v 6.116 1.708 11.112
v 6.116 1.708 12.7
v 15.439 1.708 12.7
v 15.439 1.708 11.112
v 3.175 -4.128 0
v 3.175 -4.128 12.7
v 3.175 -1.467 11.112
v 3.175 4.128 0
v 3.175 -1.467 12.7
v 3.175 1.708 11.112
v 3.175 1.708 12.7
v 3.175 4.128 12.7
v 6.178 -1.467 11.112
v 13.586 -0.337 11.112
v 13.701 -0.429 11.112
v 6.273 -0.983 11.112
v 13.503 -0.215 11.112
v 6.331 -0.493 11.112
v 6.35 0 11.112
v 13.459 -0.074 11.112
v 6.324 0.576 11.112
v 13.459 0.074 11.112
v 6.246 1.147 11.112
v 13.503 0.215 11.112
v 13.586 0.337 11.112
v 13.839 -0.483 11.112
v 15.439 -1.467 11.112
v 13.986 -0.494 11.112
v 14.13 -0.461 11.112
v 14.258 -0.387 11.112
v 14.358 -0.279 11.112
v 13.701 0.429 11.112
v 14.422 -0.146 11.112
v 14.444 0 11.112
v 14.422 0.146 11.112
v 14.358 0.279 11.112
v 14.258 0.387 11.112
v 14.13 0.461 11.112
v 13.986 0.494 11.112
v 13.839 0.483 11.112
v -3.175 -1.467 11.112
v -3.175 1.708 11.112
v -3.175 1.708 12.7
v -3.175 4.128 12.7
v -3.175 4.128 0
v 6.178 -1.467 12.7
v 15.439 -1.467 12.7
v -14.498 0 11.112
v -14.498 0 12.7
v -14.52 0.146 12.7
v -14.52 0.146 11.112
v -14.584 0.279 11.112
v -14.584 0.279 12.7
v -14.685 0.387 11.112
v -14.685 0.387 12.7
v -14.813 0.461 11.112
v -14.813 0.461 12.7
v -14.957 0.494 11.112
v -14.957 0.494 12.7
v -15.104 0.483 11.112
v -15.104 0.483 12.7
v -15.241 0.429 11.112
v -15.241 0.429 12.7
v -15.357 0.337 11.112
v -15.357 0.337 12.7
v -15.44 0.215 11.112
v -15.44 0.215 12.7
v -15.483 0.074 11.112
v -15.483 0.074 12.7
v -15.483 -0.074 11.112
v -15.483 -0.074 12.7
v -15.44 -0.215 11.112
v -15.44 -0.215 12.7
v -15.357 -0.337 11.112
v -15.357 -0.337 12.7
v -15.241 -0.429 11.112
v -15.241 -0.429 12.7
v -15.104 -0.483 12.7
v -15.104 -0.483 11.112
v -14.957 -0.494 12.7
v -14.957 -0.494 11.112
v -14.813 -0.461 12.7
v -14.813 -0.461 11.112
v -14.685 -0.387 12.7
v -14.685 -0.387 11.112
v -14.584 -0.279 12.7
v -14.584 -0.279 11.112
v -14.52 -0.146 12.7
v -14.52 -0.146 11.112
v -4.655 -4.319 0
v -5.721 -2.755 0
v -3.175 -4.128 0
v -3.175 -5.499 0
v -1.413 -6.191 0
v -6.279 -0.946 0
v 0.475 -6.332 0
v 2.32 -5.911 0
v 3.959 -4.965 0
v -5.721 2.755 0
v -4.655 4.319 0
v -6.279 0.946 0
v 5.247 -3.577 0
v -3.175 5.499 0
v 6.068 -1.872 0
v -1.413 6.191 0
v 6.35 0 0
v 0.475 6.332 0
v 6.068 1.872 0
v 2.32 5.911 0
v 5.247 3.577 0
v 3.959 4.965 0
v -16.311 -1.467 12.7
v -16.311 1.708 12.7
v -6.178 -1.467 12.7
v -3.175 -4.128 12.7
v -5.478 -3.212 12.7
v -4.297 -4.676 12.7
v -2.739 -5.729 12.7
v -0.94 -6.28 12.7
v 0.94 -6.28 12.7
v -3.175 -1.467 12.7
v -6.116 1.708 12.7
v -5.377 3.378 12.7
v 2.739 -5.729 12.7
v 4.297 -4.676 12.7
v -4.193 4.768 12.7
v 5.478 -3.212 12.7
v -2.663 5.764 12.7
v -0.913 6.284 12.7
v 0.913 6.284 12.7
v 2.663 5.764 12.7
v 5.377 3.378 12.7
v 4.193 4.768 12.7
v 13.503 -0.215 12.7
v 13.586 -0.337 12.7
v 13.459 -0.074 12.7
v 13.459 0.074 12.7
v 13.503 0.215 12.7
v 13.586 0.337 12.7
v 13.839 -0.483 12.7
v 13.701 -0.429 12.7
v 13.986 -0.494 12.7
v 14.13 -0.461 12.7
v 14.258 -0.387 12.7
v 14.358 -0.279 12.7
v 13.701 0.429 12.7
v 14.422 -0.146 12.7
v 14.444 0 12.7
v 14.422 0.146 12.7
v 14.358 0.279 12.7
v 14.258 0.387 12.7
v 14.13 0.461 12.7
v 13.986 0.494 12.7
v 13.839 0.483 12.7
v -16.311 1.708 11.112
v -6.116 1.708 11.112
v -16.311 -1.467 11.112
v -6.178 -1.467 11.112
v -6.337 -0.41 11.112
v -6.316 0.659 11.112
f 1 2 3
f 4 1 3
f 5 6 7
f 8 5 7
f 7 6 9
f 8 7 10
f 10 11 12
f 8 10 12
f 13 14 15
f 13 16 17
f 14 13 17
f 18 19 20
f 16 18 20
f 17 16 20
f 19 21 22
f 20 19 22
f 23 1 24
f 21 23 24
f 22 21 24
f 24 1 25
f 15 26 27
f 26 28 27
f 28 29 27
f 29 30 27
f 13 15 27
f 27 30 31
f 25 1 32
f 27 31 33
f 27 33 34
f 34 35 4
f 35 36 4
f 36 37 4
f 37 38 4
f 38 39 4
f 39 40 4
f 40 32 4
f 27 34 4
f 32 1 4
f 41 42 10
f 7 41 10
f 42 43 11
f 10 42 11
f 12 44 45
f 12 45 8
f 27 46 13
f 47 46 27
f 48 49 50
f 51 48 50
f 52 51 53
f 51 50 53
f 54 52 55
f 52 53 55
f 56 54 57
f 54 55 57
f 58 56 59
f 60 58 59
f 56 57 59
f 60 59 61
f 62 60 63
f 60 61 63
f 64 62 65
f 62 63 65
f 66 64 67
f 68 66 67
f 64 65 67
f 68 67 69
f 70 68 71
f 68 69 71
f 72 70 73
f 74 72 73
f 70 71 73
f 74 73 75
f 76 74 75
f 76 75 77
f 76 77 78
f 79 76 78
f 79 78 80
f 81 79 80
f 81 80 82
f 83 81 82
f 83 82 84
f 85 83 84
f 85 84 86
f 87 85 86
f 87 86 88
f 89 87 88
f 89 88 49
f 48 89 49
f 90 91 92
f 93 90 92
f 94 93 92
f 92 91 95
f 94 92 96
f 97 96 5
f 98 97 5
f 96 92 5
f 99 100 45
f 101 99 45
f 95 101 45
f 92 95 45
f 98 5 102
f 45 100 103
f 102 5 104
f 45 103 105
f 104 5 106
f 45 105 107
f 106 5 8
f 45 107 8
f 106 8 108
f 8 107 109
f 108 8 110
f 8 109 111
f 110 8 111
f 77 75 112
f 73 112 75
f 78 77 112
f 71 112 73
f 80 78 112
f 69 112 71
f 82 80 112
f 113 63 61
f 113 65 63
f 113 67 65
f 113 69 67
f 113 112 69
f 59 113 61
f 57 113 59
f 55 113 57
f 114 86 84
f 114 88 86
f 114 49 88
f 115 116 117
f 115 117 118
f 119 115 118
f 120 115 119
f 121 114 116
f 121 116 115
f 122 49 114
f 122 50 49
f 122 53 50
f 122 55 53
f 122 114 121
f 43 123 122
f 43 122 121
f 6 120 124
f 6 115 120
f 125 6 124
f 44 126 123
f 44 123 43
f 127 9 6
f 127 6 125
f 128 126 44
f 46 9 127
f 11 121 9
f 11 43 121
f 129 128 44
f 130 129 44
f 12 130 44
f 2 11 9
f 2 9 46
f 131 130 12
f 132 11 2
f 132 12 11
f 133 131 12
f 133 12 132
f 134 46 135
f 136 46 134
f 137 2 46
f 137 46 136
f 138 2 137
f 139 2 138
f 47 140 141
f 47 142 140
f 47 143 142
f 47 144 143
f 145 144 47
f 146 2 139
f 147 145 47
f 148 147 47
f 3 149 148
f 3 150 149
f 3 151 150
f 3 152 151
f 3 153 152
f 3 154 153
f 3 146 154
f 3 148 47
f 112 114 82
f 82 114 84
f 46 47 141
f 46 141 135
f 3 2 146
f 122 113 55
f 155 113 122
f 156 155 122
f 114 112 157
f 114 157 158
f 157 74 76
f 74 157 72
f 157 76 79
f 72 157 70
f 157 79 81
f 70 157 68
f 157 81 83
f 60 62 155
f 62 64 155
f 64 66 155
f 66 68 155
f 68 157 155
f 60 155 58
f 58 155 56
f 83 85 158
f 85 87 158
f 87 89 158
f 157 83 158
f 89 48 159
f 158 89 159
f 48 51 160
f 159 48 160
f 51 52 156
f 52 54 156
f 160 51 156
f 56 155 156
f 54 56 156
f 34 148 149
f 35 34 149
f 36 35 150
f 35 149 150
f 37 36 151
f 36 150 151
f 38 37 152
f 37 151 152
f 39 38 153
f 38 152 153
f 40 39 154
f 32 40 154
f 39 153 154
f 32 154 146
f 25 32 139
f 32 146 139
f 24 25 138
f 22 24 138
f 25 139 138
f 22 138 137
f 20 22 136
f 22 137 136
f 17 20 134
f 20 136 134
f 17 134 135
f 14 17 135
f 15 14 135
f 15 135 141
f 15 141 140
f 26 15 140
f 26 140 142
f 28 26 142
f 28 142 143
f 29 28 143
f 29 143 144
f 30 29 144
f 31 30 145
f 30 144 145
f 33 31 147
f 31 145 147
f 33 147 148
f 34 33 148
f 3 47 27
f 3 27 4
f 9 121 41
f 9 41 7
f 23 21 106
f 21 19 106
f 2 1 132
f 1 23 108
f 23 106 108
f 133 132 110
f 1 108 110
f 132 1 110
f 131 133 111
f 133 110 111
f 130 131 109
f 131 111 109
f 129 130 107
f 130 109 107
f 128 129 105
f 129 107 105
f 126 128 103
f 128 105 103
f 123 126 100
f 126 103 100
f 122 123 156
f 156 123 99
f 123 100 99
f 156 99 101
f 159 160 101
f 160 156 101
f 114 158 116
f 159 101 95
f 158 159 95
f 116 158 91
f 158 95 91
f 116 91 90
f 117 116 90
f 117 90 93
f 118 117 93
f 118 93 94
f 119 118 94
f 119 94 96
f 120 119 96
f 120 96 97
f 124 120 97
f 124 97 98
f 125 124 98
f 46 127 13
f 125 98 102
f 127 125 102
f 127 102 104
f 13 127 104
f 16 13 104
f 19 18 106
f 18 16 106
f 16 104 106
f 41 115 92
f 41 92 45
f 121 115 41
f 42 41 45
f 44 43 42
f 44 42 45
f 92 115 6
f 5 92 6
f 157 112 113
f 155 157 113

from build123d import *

# Parameters (mm, degrees)
F0_R      = 6.35
F1_DEPTH  = 12.7
F2_W      = 6.35
F2_H      = 8.255
F3_DEPTH  = 25.4
F4_W      = 31.75
F4_H      = 3.175
F5_DEPTH  = 1.5875
F6_R      = 0.4953
F7_DEPTH  = 1.5875
F9_R      = 0.4953
F10_DEPTH = 25.4


with BuildPart() as f1:
    # F0 (on Top) → F1 (new body)
    with BuildSketch(Plane.XY):
        Circle(F0_R)
    extrude(amount=F1_DEPTH)

    # F2 (on face) → F3 (cut)
    with BuildSketch(Plane.XY.offset(12.7)):
        Rectangle(F2_W, F2_H)
    extrude(amount=-F3_DEPTH, mode=Mode.SUBTRACT)

    # F4 (on face) → F5 (join)
    with BuildSketch(Plane.XY.offset(12.7)):
        with Locations((-0.4356827326, 0.1208083219)):
            Rectangle(F4_W, F4_H)
    extrude(amount=-F5_DEPTH)

    # F6 (on face) → F7 (cut)
    with BuildSketch(Plane.XY.offset(12.7)):
        with Locations((13.9489074385, 0)):
            Circle(F6_R)
    extrude(amount=-F7_DEPTH, mode=Mode.SUBTRACT)

    # F9 (on face) → F10 (cut)
    with BuildSketch(Plane.XY.offset(12.7)):
        with Locations((-14.99362, 0)):
            Circle(F9_R)
    extrude(amount=-F10_DEPTH, mode=Mode.SUBTRACT)


solid = f1.part
